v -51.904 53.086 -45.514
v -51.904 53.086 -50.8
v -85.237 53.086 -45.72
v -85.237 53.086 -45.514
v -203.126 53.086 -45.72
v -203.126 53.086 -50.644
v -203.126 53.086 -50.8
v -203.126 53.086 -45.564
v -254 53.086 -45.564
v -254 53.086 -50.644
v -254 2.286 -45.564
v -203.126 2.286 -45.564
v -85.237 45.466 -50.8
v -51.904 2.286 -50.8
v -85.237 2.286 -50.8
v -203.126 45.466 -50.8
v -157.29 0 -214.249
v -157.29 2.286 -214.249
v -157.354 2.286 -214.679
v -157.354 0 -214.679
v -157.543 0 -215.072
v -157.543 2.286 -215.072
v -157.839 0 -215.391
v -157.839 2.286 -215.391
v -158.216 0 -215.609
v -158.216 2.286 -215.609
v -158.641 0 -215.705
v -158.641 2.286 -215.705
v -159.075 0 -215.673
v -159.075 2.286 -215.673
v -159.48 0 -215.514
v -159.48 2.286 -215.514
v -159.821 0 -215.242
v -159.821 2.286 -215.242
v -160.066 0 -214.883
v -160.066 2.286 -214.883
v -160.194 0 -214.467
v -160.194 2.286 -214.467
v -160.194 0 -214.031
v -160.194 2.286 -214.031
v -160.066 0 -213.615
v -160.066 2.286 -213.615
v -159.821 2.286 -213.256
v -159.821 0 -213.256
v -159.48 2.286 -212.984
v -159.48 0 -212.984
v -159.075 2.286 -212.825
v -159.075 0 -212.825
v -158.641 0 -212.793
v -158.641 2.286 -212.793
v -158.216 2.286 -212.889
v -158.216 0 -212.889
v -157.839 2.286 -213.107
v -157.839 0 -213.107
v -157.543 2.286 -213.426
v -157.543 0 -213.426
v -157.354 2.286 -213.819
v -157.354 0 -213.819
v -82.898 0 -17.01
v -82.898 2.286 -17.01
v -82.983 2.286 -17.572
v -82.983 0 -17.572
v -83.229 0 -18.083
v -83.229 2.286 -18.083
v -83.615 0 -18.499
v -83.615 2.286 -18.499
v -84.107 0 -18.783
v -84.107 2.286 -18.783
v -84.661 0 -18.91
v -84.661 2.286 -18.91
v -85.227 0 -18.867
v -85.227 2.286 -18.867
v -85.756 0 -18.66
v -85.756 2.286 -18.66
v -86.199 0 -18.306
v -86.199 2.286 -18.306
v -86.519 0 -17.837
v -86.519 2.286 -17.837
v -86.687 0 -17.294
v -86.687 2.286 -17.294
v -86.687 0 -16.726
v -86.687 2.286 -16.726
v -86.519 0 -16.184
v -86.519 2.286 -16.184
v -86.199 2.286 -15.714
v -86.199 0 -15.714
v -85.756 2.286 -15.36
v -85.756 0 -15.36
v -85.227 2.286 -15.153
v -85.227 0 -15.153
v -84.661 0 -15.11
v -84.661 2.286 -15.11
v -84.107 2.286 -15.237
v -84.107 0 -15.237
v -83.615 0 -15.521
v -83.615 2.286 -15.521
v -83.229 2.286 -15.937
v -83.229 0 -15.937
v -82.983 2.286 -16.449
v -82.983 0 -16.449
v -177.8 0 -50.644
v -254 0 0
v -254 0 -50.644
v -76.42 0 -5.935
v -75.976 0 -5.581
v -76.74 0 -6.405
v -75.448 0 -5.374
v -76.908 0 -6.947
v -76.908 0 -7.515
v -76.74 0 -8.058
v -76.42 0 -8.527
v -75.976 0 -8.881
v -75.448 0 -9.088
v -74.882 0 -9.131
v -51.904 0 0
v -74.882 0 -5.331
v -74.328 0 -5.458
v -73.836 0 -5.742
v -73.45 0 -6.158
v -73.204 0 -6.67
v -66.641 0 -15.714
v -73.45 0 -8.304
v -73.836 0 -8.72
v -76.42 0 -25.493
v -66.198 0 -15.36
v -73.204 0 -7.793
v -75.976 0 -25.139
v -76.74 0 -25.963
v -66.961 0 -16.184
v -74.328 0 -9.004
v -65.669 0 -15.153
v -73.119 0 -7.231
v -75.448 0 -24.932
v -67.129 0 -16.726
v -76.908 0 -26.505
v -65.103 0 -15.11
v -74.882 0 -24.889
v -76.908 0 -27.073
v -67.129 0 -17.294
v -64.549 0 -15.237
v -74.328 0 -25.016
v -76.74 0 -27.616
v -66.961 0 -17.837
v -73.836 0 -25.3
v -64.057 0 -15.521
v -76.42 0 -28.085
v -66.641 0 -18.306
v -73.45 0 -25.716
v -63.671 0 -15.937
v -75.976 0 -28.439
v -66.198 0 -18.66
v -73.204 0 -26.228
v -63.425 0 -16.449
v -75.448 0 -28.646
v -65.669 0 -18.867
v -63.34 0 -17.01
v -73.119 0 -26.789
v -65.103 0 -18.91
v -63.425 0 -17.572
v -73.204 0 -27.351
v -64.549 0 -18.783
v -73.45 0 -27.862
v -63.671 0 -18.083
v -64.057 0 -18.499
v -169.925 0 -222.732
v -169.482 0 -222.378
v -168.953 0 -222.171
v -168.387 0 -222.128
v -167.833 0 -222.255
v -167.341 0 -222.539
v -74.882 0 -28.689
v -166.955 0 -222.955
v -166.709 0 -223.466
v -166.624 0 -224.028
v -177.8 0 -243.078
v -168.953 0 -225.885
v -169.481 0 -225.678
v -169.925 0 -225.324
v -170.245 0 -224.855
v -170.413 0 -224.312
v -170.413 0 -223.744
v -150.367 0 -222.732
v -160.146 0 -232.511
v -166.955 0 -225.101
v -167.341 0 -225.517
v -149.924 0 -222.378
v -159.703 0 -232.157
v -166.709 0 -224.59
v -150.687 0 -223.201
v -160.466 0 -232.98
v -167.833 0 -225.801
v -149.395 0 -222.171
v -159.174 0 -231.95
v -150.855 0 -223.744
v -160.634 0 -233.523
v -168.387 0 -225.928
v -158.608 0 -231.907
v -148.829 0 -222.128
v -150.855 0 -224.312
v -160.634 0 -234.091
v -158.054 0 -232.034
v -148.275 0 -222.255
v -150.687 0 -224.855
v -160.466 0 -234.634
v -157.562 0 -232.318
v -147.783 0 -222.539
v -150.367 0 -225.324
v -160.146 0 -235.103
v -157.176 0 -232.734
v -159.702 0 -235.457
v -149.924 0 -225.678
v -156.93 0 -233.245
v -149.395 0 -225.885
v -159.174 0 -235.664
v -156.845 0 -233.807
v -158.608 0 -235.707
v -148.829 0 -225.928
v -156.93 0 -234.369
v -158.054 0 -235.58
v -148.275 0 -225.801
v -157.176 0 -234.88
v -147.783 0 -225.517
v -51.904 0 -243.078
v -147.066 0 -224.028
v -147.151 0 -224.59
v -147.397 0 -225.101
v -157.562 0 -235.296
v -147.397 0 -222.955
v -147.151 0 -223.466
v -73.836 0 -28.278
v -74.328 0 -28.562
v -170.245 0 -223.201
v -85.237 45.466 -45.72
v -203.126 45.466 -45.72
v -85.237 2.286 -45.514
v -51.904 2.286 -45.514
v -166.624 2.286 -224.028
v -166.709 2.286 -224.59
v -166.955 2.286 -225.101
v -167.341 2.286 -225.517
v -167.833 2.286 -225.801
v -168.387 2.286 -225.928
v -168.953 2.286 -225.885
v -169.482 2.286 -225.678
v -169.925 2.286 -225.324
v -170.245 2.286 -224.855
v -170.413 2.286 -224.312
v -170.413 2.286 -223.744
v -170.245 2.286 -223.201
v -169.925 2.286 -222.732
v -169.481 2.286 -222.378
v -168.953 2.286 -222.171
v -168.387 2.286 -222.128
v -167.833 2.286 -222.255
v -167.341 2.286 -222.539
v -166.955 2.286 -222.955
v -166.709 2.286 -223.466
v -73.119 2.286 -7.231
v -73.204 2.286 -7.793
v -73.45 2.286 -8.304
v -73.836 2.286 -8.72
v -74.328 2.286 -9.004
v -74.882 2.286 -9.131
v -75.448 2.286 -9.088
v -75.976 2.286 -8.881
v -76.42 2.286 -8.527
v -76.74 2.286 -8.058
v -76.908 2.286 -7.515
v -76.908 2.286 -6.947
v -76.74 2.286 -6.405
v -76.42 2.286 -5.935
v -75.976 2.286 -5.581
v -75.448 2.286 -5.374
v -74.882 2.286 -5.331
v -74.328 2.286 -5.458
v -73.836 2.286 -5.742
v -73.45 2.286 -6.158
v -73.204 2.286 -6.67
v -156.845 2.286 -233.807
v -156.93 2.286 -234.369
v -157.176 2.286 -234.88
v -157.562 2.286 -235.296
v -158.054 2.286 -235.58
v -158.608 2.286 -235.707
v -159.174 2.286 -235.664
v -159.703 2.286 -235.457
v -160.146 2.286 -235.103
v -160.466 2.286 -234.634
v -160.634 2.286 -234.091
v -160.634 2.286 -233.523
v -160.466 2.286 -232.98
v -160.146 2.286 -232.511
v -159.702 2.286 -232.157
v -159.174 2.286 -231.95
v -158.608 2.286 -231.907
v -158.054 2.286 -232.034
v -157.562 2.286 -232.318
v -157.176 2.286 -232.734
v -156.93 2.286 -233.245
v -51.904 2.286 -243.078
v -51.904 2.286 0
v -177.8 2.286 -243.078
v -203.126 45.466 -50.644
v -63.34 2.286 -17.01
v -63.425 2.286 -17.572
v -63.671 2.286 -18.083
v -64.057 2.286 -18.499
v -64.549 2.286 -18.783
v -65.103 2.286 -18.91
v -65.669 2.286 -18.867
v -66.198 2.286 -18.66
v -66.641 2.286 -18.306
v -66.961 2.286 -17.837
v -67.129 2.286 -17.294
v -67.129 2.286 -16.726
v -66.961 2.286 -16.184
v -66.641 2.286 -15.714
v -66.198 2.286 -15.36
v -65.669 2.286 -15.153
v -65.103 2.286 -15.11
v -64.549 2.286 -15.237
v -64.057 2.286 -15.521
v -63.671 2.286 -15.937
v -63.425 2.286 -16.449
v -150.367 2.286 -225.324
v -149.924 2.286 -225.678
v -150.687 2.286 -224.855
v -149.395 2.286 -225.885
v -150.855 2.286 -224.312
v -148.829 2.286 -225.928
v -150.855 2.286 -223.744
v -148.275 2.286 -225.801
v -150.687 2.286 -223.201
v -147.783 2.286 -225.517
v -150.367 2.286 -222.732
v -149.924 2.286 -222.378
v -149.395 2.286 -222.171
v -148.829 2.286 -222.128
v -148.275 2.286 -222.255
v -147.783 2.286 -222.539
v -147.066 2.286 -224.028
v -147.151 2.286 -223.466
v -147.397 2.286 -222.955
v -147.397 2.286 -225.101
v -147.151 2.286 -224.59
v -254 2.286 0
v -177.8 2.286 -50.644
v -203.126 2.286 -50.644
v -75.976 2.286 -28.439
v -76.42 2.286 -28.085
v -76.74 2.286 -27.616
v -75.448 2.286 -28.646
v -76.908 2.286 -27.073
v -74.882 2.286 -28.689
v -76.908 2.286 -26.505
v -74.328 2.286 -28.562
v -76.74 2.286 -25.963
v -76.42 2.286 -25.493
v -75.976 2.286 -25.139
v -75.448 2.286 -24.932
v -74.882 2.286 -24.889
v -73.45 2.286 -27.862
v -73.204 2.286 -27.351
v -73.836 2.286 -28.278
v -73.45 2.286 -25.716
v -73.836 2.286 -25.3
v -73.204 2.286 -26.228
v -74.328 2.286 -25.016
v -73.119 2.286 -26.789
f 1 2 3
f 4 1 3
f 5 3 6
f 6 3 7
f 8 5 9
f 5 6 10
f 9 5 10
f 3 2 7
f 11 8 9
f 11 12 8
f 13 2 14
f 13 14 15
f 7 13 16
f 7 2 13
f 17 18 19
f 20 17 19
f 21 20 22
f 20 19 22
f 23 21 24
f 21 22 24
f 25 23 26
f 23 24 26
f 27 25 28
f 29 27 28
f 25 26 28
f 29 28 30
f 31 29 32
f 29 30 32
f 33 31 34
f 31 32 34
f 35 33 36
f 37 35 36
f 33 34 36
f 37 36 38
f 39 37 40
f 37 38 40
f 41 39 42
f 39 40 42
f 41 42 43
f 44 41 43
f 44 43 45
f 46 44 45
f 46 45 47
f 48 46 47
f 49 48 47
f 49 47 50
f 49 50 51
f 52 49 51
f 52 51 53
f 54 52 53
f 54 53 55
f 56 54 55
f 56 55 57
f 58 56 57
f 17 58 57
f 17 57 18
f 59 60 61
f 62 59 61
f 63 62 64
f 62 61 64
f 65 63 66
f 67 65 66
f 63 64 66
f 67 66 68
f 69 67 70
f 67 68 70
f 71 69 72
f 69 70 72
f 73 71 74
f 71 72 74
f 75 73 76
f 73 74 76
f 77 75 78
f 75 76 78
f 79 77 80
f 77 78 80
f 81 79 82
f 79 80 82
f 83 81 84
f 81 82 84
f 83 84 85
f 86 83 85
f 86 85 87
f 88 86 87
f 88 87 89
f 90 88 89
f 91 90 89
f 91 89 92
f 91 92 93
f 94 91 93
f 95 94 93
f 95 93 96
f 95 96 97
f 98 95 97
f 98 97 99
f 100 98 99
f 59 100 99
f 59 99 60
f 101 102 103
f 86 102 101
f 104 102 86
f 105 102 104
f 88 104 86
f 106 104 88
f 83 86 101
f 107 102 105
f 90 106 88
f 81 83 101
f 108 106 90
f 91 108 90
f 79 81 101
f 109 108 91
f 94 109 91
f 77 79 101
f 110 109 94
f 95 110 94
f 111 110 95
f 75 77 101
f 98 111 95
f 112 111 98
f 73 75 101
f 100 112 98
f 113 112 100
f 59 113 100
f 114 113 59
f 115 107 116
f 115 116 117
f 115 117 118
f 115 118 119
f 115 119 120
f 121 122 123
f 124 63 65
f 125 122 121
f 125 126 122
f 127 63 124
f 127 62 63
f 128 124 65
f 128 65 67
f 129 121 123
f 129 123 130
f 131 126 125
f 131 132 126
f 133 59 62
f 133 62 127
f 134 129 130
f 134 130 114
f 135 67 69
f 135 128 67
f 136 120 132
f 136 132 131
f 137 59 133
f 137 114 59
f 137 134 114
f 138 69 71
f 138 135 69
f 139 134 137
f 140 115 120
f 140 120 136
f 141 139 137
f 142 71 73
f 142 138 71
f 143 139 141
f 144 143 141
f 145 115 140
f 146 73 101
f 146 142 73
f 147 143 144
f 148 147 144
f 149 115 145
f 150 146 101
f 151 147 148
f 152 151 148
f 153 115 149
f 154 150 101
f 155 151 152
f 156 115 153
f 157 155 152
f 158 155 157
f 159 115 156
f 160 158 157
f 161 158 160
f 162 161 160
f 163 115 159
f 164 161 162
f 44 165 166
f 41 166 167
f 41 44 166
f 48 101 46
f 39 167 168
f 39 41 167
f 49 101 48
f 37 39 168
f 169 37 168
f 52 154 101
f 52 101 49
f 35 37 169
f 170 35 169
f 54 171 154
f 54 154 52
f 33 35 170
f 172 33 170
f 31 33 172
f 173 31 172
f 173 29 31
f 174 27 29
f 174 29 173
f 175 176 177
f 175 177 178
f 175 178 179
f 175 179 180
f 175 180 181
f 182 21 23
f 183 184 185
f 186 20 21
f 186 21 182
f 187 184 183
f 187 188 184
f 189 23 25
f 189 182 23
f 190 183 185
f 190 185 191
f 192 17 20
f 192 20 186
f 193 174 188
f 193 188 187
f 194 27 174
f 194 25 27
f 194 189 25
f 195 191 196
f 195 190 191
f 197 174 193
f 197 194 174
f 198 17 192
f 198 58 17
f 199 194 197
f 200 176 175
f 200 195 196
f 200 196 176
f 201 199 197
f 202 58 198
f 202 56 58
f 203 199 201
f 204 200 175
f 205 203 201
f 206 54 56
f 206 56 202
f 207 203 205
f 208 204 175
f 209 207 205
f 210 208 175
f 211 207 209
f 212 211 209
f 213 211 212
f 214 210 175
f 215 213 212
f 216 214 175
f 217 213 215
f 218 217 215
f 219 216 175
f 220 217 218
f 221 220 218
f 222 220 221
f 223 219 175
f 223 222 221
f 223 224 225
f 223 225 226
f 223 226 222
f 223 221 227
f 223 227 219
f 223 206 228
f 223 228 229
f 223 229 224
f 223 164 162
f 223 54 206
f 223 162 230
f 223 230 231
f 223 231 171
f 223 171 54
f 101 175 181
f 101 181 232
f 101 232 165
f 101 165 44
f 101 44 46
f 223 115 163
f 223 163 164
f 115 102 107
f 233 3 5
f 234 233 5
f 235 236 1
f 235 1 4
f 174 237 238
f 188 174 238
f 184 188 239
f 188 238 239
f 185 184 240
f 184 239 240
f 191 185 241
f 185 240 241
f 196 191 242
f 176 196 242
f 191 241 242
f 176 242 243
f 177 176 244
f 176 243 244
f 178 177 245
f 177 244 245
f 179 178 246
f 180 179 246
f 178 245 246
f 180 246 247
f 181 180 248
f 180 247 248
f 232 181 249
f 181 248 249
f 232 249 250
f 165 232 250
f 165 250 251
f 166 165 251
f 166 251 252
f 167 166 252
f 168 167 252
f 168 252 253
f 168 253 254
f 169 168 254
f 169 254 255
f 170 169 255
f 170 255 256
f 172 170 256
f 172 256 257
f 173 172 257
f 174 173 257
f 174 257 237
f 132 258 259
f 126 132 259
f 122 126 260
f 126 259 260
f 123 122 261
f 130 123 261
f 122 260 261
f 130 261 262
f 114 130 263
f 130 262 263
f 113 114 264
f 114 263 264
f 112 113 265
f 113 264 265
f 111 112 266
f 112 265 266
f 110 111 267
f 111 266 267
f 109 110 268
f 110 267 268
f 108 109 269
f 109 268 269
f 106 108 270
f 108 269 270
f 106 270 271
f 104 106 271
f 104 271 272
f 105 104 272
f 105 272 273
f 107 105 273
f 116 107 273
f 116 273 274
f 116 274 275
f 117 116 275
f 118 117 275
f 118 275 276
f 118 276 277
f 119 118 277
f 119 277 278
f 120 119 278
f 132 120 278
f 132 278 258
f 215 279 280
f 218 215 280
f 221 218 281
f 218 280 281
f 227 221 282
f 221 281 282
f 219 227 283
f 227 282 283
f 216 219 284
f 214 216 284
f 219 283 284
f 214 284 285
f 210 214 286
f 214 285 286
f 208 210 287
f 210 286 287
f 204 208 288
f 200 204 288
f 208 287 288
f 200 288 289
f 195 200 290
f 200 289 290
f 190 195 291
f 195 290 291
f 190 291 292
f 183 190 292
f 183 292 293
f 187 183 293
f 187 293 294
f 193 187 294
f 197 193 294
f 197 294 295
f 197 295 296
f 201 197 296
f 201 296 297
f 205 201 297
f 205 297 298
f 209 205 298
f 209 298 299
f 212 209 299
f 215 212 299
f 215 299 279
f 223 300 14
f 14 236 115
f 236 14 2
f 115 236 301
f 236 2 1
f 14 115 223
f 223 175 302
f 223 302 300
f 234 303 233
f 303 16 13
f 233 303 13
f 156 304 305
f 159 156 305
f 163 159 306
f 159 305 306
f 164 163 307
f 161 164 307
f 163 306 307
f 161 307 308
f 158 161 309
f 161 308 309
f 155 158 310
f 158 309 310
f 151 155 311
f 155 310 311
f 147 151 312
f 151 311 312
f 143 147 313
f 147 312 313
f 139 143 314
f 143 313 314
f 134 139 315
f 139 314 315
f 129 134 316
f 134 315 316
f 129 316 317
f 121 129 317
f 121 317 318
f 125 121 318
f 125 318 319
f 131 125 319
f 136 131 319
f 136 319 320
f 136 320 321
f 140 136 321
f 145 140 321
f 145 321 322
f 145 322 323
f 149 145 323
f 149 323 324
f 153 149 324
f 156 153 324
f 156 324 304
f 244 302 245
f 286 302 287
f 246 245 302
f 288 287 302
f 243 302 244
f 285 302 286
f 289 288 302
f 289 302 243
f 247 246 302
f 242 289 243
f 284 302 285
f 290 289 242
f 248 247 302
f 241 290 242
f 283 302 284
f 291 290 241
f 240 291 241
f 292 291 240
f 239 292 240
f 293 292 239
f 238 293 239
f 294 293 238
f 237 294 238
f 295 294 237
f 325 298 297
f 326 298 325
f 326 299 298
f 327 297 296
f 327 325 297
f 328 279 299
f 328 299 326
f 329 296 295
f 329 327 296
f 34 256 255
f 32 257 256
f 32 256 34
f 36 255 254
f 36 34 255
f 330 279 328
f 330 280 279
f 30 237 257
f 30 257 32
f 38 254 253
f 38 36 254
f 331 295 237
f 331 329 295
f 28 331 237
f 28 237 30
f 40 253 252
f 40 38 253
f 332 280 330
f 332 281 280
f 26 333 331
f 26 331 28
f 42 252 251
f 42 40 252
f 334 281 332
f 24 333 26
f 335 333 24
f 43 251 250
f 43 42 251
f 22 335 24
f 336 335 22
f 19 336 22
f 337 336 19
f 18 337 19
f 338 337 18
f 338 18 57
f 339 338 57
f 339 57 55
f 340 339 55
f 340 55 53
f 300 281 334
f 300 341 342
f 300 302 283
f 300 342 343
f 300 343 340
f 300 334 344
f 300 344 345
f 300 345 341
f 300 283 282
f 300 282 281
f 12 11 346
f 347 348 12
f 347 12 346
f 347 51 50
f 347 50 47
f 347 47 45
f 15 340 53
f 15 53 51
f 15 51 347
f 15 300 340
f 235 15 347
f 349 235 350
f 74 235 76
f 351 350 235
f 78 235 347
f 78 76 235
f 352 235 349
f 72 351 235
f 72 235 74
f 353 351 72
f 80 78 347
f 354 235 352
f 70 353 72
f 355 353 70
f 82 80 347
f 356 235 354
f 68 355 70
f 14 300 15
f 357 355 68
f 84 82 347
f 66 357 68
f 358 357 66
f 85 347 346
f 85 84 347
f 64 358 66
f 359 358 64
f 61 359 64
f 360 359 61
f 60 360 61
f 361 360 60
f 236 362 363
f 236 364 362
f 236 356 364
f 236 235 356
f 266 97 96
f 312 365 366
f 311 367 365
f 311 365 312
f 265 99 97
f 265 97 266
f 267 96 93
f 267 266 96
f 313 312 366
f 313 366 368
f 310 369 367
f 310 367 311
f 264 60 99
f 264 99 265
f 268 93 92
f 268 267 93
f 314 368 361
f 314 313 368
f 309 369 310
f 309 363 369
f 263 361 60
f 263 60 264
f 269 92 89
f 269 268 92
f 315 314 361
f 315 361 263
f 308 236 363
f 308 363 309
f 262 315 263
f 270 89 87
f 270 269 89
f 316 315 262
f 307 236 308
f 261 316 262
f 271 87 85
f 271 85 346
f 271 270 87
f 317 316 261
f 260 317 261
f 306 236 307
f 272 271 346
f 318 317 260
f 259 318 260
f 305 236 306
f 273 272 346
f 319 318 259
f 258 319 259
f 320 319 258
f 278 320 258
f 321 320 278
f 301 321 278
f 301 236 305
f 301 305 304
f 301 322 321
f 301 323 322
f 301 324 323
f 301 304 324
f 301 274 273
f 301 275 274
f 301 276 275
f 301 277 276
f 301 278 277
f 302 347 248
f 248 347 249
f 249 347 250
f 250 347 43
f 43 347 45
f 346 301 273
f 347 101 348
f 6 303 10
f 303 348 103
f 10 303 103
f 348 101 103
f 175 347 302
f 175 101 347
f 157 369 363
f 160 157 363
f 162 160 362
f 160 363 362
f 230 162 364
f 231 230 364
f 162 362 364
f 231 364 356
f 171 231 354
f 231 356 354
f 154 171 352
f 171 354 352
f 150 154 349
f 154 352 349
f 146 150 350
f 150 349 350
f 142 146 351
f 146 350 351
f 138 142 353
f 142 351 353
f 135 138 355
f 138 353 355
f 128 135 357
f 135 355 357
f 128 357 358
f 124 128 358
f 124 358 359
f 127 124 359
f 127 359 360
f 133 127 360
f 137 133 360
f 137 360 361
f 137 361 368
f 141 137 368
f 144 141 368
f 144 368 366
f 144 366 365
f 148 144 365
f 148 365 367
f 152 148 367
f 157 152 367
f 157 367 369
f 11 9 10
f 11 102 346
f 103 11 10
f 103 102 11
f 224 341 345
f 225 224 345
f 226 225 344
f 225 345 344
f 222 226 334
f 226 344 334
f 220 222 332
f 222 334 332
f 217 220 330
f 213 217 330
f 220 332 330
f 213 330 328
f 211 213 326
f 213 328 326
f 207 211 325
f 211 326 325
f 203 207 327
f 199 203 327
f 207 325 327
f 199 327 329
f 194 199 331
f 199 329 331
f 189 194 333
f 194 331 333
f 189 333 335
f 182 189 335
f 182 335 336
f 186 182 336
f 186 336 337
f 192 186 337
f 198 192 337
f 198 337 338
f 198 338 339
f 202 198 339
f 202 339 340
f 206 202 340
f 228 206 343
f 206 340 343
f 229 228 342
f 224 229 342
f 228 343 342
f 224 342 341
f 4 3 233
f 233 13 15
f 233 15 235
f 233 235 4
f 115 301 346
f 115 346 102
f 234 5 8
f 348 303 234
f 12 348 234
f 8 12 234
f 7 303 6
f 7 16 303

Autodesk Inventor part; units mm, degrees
ref_plane "YZ Plane" through (0, 0, 0) normal (1, 0, 0) x (0, 1, 0)
ref_plane "XZ Plane" through (0, 0, 0) normal (0, 1, 0) x (-1, 0, 0)
ref_plane "XY Plane" through (0, 0, 0) normal (0, 0, 1) x (1, 0, 0)
sketch "Sketch1" plane through (0, 0, 0) normal (0, 1, 0) x (-1, 0, 0)
  line L0 (0, 0) -> (177.8, 0)
  line L1 (177.8, 0) -> (177.8, -243.078)
  line L2 (177.8, -243.078) -> (0, -243.078)
  line L3 (0, -243.078) -> (0, 0)
  dimension "d0" = 243.078
  dimension "d1" = 177.8
extrude "Extrusion1" add sketch "Sketch1" along normal blind 2.286
sketch "Sketch2" plane through (0, 2.286, 0) normal (0, 1, 0) x (1, 0, 0)
  circle A0 centre (-75.024, 26.7891) radius 1.905
  circle A1 centre (-65.245, 17.0101) radius 1.905
  circle A2 centre (-75.024, 7.2311) radius 1.905
  circle A3 centre (-84.803, 17.0101) radius 1.905
  dimension "d7" = 3.81
  dimension "d8" = 3.81
  dimension "d9" = 3.81
  dimension "d10" = 3.81
extrude "Extrusion2" cut sketch "Sketch2" against normal blind 5.461
sketch "Sketch4" plane through (0, 2.286, 0) normal (0, 1, 0) x (1, 0, 0)
  line L0 (0, 0) -> (-177.8, 0)
  line L1 (-177.8, 0) -> (-177.8, 50.8)
  line L2 (-177.8, 50.8) -> (0, 50.8)
  line L3 (0, 50.8) -> (0, 45.5143)
  line L4 (0, 0) -> (0, 243.078) projected
  line L5 (0, 45.5143) -> (-177.8, 45.5143)
  line L6 (-85.237, 50.8) -> (-85.237, 45.5143)
  point P0 (0, 188.468)
  dimension "d16" = 50.8
extrude "Extrusion4" add sketch "Sketch4" along normal blind 50.8 contours L5 L6 L2 L3
sketch "Sketch6" plane through (-177.8, 0, -243.078) normal (-1, 0, 0) x (0, 0, 1)
  line L0 (243.078, 0) -> (0, 0) projected
  line L1 (0, 2.286) -> (243.078, 2.286) projected
  line L2 (243.078, 0) -> (192.4335, 0)
  line L3 (192.4335, 0) -> (192.4335, 2.286)
  line L4 (192.4335, 2.286) -> (243.078, 2.286)
  line L5 (243.078, 2.286) -> (243.078, 0)
  point P0 (3.81, 2.286)
  point P1 (243.078, 2.286)
  point P2 (192.4335, 0)
  dimension "d28" = 243.078
extrude "Extrusion6" add sketch "Sketch6" along normal blind 76.2
sketch "Sketch7" plane through (0, 2.286, 0) normal (0, 1, 0) x (1, 0, 0)
  line L0 (-177.8, 50.6445) -> (-254, 50.6445) projected
  line L1 (-254, 50.6445) -> (-203.1257, 50.6445)
  line L2 (-203.1257, 50.6445) -> (-203.1257, 45.5645)
  line L3 (-203.1257, 45.5645) -> (-254, 45.5645)
  line L4 (-254, 45.5645) -> (-254, 50.6445)
  point P0 (0, 0)
  dimension "d31" = 5.08
extrude "Extrusion7" add sketch "Sketch7" along normal blind 50.8
sketch "Sketch8" plane through (0, 2.286, -50.8) normal (0, 0, -1) x (-1, 0, 0)
  line L0 (0, 50.8) -> (85.237, 50.8) projected
  line L1 (203.1257, 0) -> (203.1257, 50.8) projected
  line L2 (85.237, 50.8) -> (203.1257, 50.8)
  line L3 (203.1257, 50.8) -> (203.1257, 43.18)
  line L4 (203.1257, 43.18) -> (85.237, 43.18)
  line L5 (85.237, 43.18) -> (85.237, 50.8)
  point P0 (0, -2.286)
  dimension "d34" = 50.8
  dimension "d35" = 7.62
extrude "Extrusion8" add sketch "Sketch8" against normal blind 5.08
sketch "Sketch10" plane through (0, 53.086, 0) normal (0, 1, 0) x (1, 0, 0)
  line L0 (0, 0) -> (-254, 0) projected
  line L1 (0, 188.468) -> (-177.8, 188.468) projected
  line L2 (-51.904, 0) -> (0, 0)
  line L3 (0, 0) -> (0, 188.468)
  line L4 (0, 188.468) -> (-51.904, 188.468)
  line L5 (-51.904, 188.468) -> (-51.904, 0)
  line L6 (0, 243.078) -> (-177.8, 243.078) projected
  line L7 (-51.904, 188.468) -> (0, 188.468)
  line L8 (0, 188.468) -> (0, 243.078)
  line L9 (0, 243.078) -> (-51.904, 243.078)
  line L10 (-51.904, 243.078) -> (-51.904, 188.468)
extrude "Extrusion9" cut sketch "Sketch10" against normal blind 87.3125
sketch "Sketch11" plane through (0, 2.286, 0) normal (0, 1, 0) x (1, 0, 0)
  line L0 (-177.8, 243.078) -> (-177.8, 50.6445) projected
  line L1 (-177.8, 243.078) -> (-139.7, 243.078)
  line L2 (-139.7, 243.078) -> (-139.7, 204.978)
  line L3 (-139.7, 204.978) -> (-177.8, 204.978)
  line L4 (-177.8, 204.978) -> (-177.8, 243.078)
  circle A0 centre (-158.75, 224.028) radius 9.779
  circle A1 centre (-168.529, 224.028) radius 1.905
  circle A2 centre (-158.75, 233.807) radius 1.905
  circle A3 centre (-158.75, 214.249) radius 1.4605
  circle A4 centre (-148.971, 224.028) radius 1.905
  point P0 (0, 0)
  dimension "d40" = 38.1
  dimension "d41" = 38.1
  dimension "d42" = 19.558
  dimension "d43" = 3.81
  dimension "d44" = 3.81
  dimension "d45" = 2.921
  dimension "d46" = 3.81
extrude "Extrusion10" cut sketch "Sketch11" against normal blind 25.4 contours A0 A4 | A0 A4 | A2 A0 | A0 A2 | A3 A0 | A0 A3 | A1 A0 | A0 A1
properties part number "Plate"
